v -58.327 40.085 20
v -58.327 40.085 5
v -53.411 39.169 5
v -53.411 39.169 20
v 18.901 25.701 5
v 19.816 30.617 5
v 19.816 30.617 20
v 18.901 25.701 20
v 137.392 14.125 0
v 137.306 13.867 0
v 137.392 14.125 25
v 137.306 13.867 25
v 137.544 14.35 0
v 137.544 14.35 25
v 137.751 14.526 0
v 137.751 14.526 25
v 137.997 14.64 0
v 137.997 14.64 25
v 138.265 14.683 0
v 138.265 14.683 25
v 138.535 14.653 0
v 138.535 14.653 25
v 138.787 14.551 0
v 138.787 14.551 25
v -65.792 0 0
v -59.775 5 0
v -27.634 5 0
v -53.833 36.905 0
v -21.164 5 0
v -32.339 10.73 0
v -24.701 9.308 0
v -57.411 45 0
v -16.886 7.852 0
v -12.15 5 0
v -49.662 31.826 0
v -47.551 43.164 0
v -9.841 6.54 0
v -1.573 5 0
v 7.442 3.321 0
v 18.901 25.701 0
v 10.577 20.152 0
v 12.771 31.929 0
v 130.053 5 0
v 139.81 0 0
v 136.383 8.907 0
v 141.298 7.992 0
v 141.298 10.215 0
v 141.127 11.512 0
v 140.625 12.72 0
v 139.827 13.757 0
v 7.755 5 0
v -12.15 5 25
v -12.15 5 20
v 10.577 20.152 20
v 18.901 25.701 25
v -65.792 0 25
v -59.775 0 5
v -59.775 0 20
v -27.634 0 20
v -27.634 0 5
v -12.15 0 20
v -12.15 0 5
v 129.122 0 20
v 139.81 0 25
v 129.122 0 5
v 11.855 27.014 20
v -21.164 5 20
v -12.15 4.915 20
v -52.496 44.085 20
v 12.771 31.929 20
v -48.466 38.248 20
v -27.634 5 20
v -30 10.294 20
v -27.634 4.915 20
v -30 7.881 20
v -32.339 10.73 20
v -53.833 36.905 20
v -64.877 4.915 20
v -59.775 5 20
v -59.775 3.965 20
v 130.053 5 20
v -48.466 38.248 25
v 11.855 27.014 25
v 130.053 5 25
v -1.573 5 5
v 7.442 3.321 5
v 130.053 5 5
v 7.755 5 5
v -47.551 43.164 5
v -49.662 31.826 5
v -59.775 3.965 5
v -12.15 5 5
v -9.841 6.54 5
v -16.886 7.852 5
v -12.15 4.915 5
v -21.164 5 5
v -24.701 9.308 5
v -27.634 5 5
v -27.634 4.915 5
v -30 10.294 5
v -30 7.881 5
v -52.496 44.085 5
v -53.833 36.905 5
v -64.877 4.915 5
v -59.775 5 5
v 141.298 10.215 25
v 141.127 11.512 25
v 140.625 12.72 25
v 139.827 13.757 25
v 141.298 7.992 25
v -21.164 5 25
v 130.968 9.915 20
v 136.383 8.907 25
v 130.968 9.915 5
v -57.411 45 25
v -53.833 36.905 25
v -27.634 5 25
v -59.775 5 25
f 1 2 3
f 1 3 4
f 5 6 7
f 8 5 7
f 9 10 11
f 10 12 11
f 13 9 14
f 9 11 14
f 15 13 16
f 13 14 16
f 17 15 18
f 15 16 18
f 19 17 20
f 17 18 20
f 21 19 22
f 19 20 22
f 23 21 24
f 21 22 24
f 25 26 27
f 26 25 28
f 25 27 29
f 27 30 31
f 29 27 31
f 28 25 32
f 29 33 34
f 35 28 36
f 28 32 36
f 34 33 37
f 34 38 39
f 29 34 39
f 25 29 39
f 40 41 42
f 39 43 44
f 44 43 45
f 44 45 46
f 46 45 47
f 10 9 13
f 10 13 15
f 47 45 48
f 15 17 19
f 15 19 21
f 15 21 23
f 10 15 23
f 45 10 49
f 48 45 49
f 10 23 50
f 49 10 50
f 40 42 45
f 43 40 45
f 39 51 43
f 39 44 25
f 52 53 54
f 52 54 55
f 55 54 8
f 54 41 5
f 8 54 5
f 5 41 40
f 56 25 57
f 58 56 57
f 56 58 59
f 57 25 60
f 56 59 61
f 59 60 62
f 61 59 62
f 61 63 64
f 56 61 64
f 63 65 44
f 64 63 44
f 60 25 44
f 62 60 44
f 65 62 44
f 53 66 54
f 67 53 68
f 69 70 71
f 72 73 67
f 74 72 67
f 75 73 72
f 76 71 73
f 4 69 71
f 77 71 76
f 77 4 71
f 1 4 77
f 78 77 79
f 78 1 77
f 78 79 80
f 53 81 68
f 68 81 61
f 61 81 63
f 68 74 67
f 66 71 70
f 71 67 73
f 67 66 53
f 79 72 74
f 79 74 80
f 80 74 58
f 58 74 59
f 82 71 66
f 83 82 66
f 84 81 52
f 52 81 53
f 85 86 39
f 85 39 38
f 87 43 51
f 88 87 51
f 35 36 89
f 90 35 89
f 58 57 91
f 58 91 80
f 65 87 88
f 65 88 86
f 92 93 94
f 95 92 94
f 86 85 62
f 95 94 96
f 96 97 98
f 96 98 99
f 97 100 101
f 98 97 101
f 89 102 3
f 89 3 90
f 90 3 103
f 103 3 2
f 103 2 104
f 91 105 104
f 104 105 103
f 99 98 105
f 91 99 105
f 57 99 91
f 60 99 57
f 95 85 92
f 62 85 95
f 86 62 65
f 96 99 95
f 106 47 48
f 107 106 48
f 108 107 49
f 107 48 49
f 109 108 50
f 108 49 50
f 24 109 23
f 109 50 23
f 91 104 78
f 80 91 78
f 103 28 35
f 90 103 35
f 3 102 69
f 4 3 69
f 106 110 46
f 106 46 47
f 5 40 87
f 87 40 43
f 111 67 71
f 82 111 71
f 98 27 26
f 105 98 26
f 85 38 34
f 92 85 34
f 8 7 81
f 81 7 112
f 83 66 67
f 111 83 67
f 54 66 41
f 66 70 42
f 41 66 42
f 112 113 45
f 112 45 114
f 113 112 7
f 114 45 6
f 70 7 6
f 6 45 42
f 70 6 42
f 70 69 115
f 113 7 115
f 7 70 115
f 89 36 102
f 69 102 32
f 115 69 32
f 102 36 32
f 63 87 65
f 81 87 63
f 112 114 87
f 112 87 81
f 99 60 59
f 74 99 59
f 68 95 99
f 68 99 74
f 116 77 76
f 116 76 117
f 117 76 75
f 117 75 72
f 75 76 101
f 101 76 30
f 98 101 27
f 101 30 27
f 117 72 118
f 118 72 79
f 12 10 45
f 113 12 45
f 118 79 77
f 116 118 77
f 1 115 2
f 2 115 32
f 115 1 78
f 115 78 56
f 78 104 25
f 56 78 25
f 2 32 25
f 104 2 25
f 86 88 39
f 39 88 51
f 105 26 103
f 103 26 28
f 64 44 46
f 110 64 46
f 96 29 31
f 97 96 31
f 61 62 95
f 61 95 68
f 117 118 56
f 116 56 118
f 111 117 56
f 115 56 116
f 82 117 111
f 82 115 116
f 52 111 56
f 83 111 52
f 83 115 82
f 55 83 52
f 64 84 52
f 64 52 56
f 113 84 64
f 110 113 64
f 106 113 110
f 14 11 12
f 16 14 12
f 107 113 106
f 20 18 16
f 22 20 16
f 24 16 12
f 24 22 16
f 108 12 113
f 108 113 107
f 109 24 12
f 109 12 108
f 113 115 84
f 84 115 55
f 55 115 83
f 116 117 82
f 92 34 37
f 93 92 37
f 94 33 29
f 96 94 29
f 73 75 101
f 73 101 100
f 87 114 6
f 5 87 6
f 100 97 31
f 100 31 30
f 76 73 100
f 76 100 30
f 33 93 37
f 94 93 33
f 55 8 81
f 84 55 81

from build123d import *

# Parameters (mm, degrees)
F1_DEPTH     = 25
F3_W         = 103.0636096465
F3_H         = 15
F3_W_2       = 5
F3_W_3       = 5.0301977637
F4_DEPTH     = 29.1
F5_W         = 32.1414392277
F5_H         = 15
F5_W_2       = 37.424231063
F6_DEPTH     = 5
F8_W         = 35.7737973711
F8_H         = 15
F9_DEPTH     = 25
F10_T1_DEPTH = 45.720844557
F11_R        = 1
F12_W        = 15.2368300635
F12_H        = 15
F13_DEPTH    = 30


# Not quite as in the source:
# - a fillet or chamfer that OpenCascade refuses, or shapes differently, is made with other operations: its cross-section is extruded or revolved along the edge and cut away or added


with BuildPart() as f1:
    # F0 (on Top) → F1 (new body)
    with BuildSketch(Plane.XY):
        Polygon((-57.4114776212, 45), (-65.7924397243, 0), (139.809737024, 0), (141.2981229206, 7.9916081853), (136.3826469731, 8.9070841327), align=None)
        Polygon((18.9005100522, 25.701403032), (130.0528008015, 5), (-12.1503930873, 5), (-21.1640298367, 5), (-27.6338049994, 5), (-59.7752442271, 5), (-53.8331571099, 36.9049193859), (-53.4114776212, 39.1690481052), (-48.4663143975, 38.2480430925), (11.8550538619, 27.0135741727), align=None, mode=Mode.SUBTRACT)
        Polygon((136.3826469731, 8.9070841327), (141.2981229206, 7.9916081853), (141.2981229206, 14.3588015401), (137.528741777, 15.0608246626), align=None)
        Polygon((-27.6338049994, 5), (-21.1640298367, 5), (-48.4663143975, 38.2480430925), (-53.4114776212, 39.1690481052), (-53.8331571099, 36.9049193859), align=None)
        Polygon((-12.1503930873, 5), (18.9005100522, 25.701403032), (11.8550538619, 27.0135741727), (-21.1640298367, 5), align=None)
    extrude(amount=F1_DEPTH)

    # F3 (on offset) → F4 (cut)
    with BuildSketch(Plane(origin=(6.1753463271, 33.1573608496, 0), x_dir=(-0.9830951895, 0.1830951895, 0), z_dir=(0.1830951895, 0.9830951895, 0))):
        with Locations((-70.4070020763, 12.5)):
            Rectangle(F3_W, F3_H)
        Polygon((49.6500332337, 20), (-1.7085909409, 20), (-1.7085909409, 5), (0, 5), (49.6500332337, 5), align=None)
        with Locations((-124.4388068995, 12.5)):
            Rectangle(F3_W_2, F3_H)
        with Locations((-16.375197253, 12.5)):
            Rectangle(F3_W_2, F3_H)
        Polygon((-1.7085909409, 20), (-6.7085909409, 20), (-6.7085909409, 0), (54.6500332337, 0), (54.6500332337, 5), (49.6500332337, 5), (0, 5), (-1.7085909409, 5), align=None)
        with Locations((52.1500332337, 12.5)):
            Rectangle(F3_W_2, F3_H)
        with Locations((57.1651321155, 12.5)):
            Rectangle(F3_W_3, F3_H)
    extrude(amount=-F4_DEPTH, mode=Mode.SUBTRACT)

    # F5 (on Front) → F6 (cut)
    with BuildSketch(Plane.XZ):
        with Locations((-43.7045246133, 12.5)):
            Rectangle(F5_W, F5_H)
        with Locations((6.5617224442, 12.5)):
            Rectangle(F5_W_2, F5_H)
    extrude(amount=-F6_DEPTH, mode=Mode.SUBTRACT)

    # F8 (on offset) → F9 (cut)
    with BuildSketch(Plane(origin=(-63.5868239483, 11.8426391504, 0), x_dir=(-0.1830951895, -0.9830951895, 0), z_dir=(-0.9830951895, 0.1830951895, 0))):
        with Locations((-10.8406194676, 12.5)):
            Rectangle(F8_W, F8_H)
    extrude(amount=-F9_DEPTH, mode=Mode.SUBTRACT)

    # F10: fillet of radius 5 on 1 edges, made by hand

    # F10_s2 → F10_t1 (cut)
    with BuildSketch(Plane.XY.offset(-10.3604222785)):
        with BuildLine():
            ThreePointArc((141.2981229206, 10.2146326287), (140.2448363813, 13.2843969289), (137.528741777, 15.0608246626))
            Line((137.528741777, 15.0608246626), (141.2981229206, 14.3588015401))
            Line((141.2981229206, 14.3588015401), (141.2981229206, 10.2146326287))
        make_face()
    extrude(amount=F10_T1_DEPTH, mode=Mode.SUBTRACT)

    # F11
    f11_edges = [f1.edges().sort_by_distance(p)[0] for p in [
        (137.528742, 15.060825, 12.5),
    ]]
    fillet(f11_edges, radius=F11_R)

    # F12 (on Right) → F13 (cut)
    with BuildSketch(Plane.YZ):
        with Locations((12.5338909792, 12.5)):
            Rectangle(F12_W, F12_H)
    extrude(amount=-F13_DEPTH, mode=Mode.SUBTRACT)


solid = f1.part
